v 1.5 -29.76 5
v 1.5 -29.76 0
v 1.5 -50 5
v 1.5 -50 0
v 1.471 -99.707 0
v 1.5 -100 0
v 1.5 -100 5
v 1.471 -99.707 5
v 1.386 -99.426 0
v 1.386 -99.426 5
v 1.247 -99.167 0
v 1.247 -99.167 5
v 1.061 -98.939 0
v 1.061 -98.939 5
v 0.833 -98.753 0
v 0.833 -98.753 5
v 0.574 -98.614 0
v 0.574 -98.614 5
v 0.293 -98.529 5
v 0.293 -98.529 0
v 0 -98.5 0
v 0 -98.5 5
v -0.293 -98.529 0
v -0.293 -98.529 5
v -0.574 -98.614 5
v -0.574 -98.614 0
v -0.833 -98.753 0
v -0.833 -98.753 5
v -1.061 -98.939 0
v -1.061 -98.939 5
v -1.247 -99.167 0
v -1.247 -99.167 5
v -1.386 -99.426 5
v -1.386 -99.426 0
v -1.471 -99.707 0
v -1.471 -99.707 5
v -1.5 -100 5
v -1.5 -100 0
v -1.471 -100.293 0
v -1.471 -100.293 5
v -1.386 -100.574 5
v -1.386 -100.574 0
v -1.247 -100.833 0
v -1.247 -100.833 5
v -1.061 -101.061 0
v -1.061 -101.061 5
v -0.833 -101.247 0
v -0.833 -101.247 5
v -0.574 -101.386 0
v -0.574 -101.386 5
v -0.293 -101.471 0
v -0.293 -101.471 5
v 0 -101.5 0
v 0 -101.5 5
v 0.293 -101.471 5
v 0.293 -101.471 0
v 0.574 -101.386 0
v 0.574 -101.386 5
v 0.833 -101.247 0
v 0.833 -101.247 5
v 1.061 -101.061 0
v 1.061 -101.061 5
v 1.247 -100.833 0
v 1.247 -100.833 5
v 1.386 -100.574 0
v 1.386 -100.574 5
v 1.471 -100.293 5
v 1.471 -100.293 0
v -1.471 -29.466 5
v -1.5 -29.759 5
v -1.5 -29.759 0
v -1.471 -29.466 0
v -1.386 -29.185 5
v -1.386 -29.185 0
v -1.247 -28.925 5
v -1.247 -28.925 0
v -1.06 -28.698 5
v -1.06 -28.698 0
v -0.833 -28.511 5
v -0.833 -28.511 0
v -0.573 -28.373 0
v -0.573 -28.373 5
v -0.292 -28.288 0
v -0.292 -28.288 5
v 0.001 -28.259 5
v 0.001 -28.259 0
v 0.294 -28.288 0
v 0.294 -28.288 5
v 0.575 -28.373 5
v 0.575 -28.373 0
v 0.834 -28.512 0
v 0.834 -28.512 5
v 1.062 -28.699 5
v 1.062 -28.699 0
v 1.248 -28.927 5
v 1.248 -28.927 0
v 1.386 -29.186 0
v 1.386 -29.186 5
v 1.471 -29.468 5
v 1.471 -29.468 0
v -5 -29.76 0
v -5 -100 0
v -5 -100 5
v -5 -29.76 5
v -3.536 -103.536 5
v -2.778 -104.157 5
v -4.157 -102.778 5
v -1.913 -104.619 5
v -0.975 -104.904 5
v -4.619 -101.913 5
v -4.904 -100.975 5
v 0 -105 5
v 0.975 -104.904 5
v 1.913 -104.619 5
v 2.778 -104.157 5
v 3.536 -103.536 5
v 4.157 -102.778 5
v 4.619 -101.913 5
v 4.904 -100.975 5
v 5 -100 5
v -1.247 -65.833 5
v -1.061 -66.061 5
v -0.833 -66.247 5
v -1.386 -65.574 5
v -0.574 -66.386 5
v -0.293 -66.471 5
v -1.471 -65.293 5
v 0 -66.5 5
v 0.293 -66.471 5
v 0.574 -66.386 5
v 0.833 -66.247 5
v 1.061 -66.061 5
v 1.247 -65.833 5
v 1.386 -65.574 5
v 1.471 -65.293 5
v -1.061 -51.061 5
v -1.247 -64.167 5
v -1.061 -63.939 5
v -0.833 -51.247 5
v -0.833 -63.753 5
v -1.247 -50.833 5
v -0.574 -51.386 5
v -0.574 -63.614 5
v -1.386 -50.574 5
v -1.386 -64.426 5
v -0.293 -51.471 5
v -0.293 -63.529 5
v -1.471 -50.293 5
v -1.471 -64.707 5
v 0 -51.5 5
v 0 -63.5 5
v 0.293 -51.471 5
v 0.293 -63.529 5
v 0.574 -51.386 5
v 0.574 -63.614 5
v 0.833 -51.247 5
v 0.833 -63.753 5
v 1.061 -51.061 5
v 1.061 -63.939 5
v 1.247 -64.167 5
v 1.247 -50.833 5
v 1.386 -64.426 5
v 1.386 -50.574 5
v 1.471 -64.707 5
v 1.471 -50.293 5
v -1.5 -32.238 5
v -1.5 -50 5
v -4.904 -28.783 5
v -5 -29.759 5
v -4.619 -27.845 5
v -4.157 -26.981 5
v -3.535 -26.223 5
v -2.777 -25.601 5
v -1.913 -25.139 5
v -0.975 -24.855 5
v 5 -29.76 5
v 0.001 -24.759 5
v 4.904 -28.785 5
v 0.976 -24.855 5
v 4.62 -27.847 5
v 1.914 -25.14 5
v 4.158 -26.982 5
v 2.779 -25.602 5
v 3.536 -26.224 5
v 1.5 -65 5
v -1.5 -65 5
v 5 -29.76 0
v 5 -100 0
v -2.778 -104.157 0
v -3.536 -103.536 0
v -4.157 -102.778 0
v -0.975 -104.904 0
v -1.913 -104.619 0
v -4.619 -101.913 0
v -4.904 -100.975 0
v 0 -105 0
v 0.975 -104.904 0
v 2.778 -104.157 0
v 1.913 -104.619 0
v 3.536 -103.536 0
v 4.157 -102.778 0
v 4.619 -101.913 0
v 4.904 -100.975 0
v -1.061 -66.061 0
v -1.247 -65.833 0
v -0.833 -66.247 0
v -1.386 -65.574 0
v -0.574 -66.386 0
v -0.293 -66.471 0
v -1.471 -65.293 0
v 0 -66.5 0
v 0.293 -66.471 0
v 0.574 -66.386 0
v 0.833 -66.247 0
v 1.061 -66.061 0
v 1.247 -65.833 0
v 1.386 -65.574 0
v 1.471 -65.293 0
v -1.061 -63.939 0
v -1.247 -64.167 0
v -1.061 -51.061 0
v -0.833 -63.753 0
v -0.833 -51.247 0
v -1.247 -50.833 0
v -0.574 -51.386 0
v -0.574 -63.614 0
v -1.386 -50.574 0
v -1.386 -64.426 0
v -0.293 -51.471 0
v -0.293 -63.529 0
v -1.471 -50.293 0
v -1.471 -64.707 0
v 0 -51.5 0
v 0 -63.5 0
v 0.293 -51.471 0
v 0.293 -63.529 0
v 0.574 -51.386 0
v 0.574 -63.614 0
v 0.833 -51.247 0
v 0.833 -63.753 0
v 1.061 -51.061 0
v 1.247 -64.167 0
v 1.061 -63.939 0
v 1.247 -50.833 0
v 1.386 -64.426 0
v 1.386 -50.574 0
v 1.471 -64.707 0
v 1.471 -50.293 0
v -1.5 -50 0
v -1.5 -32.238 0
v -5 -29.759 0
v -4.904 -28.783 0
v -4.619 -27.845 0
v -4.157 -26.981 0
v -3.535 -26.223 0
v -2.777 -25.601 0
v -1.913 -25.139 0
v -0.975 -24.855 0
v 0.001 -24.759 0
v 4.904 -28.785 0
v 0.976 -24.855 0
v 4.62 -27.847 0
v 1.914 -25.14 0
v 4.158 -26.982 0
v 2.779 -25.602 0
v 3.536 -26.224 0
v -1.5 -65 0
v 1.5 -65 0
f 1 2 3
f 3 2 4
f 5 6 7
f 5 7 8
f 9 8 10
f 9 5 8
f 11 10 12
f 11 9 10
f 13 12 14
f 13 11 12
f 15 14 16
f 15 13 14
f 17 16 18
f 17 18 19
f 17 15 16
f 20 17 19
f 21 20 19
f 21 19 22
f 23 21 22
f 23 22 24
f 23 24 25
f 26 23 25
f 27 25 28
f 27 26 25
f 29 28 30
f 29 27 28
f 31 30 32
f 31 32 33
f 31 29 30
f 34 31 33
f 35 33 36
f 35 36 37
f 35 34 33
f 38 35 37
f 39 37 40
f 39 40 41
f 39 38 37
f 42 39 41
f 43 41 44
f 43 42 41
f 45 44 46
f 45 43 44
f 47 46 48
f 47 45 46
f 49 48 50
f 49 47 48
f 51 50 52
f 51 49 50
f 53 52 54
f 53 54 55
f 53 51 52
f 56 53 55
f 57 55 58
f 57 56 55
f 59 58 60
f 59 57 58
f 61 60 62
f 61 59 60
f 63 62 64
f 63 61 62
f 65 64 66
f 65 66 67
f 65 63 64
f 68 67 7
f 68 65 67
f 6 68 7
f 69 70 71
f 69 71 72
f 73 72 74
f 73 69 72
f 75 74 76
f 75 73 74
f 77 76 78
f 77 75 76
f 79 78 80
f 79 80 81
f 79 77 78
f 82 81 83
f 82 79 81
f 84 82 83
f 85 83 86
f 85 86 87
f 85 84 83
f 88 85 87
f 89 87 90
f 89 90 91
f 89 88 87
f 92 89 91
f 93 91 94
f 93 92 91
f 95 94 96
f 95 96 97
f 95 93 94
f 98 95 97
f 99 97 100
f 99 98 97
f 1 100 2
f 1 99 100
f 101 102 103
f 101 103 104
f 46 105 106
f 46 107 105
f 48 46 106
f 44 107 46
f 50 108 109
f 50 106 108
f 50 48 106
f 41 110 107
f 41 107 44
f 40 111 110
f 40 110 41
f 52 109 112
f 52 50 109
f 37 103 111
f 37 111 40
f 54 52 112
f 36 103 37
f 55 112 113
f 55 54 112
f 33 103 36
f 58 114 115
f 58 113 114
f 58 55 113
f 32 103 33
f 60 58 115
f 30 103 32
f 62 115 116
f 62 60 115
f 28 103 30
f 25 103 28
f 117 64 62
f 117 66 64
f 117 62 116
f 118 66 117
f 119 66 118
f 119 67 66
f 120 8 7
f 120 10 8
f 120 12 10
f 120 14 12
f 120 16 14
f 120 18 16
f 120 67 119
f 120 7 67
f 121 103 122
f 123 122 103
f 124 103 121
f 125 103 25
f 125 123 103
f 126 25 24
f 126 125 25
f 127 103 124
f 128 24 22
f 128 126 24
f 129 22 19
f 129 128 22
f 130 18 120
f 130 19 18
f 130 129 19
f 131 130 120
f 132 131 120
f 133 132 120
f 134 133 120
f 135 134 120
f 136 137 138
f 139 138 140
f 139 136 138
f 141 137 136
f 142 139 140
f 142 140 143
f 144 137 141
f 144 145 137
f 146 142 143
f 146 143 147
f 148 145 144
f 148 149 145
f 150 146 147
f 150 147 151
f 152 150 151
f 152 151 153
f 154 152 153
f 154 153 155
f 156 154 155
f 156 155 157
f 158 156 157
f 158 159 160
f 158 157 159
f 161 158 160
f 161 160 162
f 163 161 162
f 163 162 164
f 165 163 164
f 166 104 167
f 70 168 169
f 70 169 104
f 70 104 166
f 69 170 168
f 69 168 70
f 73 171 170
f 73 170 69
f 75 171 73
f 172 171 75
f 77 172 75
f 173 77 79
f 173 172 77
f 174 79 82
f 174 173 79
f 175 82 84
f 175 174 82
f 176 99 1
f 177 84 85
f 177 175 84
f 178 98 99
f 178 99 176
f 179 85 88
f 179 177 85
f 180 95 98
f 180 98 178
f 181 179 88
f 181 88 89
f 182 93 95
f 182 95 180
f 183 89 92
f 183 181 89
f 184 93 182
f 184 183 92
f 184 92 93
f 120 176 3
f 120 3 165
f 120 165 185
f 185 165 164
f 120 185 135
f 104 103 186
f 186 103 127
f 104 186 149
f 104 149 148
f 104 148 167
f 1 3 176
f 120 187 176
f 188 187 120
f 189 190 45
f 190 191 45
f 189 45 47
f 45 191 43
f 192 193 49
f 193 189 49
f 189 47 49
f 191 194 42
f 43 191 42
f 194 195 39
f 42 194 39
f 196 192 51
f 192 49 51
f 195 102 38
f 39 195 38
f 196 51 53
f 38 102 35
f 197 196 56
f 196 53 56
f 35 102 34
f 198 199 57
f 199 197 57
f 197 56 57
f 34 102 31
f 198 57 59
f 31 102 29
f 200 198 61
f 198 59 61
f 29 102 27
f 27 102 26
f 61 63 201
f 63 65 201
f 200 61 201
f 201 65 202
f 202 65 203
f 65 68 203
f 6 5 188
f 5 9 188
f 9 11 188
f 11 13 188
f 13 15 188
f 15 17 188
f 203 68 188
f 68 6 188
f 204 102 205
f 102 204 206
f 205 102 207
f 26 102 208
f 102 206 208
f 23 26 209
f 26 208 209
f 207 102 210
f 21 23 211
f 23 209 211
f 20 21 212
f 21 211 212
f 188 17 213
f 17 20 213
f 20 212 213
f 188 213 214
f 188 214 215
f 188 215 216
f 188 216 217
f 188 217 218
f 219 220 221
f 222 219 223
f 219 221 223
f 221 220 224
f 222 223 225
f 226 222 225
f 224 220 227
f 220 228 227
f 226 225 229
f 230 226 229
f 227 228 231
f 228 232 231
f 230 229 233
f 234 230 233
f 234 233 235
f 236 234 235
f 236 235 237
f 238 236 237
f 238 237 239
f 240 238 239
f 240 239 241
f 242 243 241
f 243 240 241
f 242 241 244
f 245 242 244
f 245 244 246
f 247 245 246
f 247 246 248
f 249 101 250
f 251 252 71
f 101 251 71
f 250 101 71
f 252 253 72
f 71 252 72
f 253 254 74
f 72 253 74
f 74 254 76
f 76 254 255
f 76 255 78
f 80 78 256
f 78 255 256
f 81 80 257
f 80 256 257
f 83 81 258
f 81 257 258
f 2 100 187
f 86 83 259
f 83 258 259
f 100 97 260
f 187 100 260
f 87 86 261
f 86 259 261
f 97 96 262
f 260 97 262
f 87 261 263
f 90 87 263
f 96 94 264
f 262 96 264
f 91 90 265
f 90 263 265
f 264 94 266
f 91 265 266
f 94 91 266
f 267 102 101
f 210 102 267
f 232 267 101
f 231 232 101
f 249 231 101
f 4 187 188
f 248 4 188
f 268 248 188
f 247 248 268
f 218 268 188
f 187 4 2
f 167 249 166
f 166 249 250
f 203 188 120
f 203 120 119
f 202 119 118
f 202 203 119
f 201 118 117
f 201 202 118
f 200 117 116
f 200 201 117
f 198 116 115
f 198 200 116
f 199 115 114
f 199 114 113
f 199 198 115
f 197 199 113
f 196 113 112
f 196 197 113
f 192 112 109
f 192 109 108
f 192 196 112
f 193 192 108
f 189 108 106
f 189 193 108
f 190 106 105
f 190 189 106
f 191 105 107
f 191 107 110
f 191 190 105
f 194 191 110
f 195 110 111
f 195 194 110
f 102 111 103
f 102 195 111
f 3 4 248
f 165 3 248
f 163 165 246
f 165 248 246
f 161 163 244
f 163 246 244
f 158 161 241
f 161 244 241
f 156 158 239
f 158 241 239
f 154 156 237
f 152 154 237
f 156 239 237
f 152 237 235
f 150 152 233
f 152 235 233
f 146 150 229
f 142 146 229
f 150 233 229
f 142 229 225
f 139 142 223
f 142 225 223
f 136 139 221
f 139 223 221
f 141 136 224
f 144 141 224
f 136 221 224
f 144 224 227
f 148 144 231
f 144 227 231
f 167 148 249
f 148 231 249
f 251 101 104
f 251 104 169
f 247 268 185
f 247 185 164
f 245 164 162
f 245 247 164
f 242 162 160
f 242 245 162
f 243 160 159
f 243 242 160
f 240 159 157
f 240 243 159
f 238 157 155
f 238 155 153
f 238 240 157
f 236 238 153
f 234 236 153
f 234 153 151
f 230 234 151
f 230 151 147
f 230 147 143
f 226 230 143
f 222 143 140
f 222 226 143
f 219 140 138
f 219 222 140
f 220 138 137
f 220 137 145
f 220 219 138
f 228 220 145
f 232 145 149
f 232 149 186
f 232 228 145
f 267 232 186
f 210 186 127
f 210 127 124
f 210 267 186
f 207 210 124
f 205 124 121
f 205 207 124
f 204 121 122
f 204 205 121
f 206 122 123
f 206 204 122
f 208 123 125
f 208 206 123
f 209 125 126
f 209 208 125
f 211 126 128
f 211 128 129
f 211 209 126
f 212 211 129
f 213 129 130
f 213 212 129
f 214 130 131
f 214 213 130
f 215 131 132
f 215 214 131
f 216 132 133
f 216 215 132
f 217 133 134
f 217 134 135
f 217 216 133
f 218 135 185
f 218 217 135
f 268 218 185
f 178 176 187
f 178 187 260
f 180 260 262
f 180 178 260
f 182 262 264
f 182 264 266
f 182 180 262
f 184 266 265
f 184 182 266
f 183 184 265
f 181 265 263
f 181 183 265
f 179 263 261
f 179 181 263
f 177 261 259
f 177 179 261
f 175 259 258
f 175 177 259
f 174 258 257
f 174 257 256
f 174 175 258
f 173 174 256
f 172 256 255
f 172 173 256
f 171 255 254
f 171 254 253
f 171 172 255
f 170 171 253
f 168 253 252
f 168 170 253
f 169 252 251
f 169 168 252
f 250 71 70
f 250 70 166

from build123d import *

# Parameters (mm, degrees)
CROQUIS1_R              = 1.5
SALIENTE_EXTRUIR1_DEPTH = 5
CORTAR_EXTRUIR1_START   = -10
CORTAR_EXTRUIR1_DEPTH   = 10
CROQUIS9_W              = 21.716341412
CROQUIS9_H              = 41.96907492
CORTAR_EXTRUIR2_DEPTH   = 10
SALIENTE_EXTRUIR2_DEPTH = 5
SALIENTE_EXTRUIR3_DEPTH = 5


with BuildPart() as part:
    # Croquis1 → Saliente-Extruir1 (new body)
    with BuildSketch(Plane.XY):
        with BuildLine():
            Line((5, 0), (5, -100))
            ThreePointArc((5, -100), (0, -105), (-5, -100))
            Line((-5, -100), (-5, 0))
            ThreePointArc((-5, 0), (0, 5), (5, 0))
        make_face()
        Circle(CROQUIS1_R, mode=Mode.SUBTRACT)
        with Locations((0, -100)):
            Circle(CROQUIS1_R, mode=Mode.SUBTRACT)
        with Locations((0, -65)):
            Circle(CROQUIS1_R, mode=Mode.SUBTRACT)
    extrude(amount=SALIENTE_EXTRUIR1_DEPTH)

    # Croquis8 → Cortar-Extruir1 (cut)
    with BuildSketch(Plane.XY.offset(5).offset(CORTAR_EXTRUIR1_START)):
        with BuildLine():
            Line((1.5, 0), (1.5, -50))
            ThreePointArc((1.5, -50), (0, -51.5), (-1.5, -50))
            Line((-1.5, -50), (-1.5, 0))
            ThreePointArc((-1.5, 0), (0, 1.5), (1.5, 0))
        make_face()
    extrude(amount=CORTAR_EXTRUIR1_DEPTH, mode=Mode.SUBTRACT)

    # Croquis9 → Cortar-Extruir2 (cut)
    with BuildSketch(Plane.XY.offset(5)):
        with Locations((5.858170706, -8.775938245)):
            Rectangle(CROQUIS9_W, CROQUIS9_H)
    extrude(amount=-CORTAR_EXTRUIR2_DEPTH, mode=Mode.SUBTRACT)



with BuildPart() as body_2:
    # Croquis10 → Saliente-Extruir2 (new body)
    with BuildSketch(Plane.XY.offset(5)):
        with BuildLine():
            Line((1.5, -29.760475705), (5, -29.760475705))
            ThreePointArc((5, -29.760475705), (0.000823646, -24.758830917), (-4.999998466, -29.758830217))
            Line((-4.999998466, -29.758830217), (-1.499999097, -29.758830217))
            ThreePointArc((-1.499999097, -29.758830217), (0.000823646, -28.258830443), (1.5, -29.760475705))
        make_face()
    extrude(amount=-SALIENTE_EXTRUIR2_DEPTH)


with BuildPart() as part_1:
    add(part.part)

    add(body_2.part)  # Saliente-Extruir3 merges body 2
    # Croquis11 → Saliente-Extruir3 (add)
    with BuildSketch(Plane(origin=(0, 0, 0), x_dir=(-1, 0, 0), z_dir=(0, 0, -1))):
        with BuildLine():
            Line((-5, -29.760475705), (-5, -32.237958703))
            Line((-5, -32.237958703), (-1.5, -32.237958703))
            Line((-1.5, -32.237958703), (-1.5, -29.760475705))
            ThreePointArc((-1.5, -29.760475705), (-0.000823646, -28.258830443), (1.499999097, -29.758830217))
            Line((1.499999097, -29.758830217), (1.499999097, -32.237958703))
            Line((1.499999097, -32.237958703), (5, -32.237958703))
            Line((5, -32.237958703), (4.999998466, -29.758830217))
            ThreePointArc((4.999998466, -29.758830217), (-0.000823646, -24.758830917), (-5, -29.760475705))
        make_face()
    extrude(amount=-SALIENTE_EXTRUIR3_DEPTH)


solid = part_1.part
